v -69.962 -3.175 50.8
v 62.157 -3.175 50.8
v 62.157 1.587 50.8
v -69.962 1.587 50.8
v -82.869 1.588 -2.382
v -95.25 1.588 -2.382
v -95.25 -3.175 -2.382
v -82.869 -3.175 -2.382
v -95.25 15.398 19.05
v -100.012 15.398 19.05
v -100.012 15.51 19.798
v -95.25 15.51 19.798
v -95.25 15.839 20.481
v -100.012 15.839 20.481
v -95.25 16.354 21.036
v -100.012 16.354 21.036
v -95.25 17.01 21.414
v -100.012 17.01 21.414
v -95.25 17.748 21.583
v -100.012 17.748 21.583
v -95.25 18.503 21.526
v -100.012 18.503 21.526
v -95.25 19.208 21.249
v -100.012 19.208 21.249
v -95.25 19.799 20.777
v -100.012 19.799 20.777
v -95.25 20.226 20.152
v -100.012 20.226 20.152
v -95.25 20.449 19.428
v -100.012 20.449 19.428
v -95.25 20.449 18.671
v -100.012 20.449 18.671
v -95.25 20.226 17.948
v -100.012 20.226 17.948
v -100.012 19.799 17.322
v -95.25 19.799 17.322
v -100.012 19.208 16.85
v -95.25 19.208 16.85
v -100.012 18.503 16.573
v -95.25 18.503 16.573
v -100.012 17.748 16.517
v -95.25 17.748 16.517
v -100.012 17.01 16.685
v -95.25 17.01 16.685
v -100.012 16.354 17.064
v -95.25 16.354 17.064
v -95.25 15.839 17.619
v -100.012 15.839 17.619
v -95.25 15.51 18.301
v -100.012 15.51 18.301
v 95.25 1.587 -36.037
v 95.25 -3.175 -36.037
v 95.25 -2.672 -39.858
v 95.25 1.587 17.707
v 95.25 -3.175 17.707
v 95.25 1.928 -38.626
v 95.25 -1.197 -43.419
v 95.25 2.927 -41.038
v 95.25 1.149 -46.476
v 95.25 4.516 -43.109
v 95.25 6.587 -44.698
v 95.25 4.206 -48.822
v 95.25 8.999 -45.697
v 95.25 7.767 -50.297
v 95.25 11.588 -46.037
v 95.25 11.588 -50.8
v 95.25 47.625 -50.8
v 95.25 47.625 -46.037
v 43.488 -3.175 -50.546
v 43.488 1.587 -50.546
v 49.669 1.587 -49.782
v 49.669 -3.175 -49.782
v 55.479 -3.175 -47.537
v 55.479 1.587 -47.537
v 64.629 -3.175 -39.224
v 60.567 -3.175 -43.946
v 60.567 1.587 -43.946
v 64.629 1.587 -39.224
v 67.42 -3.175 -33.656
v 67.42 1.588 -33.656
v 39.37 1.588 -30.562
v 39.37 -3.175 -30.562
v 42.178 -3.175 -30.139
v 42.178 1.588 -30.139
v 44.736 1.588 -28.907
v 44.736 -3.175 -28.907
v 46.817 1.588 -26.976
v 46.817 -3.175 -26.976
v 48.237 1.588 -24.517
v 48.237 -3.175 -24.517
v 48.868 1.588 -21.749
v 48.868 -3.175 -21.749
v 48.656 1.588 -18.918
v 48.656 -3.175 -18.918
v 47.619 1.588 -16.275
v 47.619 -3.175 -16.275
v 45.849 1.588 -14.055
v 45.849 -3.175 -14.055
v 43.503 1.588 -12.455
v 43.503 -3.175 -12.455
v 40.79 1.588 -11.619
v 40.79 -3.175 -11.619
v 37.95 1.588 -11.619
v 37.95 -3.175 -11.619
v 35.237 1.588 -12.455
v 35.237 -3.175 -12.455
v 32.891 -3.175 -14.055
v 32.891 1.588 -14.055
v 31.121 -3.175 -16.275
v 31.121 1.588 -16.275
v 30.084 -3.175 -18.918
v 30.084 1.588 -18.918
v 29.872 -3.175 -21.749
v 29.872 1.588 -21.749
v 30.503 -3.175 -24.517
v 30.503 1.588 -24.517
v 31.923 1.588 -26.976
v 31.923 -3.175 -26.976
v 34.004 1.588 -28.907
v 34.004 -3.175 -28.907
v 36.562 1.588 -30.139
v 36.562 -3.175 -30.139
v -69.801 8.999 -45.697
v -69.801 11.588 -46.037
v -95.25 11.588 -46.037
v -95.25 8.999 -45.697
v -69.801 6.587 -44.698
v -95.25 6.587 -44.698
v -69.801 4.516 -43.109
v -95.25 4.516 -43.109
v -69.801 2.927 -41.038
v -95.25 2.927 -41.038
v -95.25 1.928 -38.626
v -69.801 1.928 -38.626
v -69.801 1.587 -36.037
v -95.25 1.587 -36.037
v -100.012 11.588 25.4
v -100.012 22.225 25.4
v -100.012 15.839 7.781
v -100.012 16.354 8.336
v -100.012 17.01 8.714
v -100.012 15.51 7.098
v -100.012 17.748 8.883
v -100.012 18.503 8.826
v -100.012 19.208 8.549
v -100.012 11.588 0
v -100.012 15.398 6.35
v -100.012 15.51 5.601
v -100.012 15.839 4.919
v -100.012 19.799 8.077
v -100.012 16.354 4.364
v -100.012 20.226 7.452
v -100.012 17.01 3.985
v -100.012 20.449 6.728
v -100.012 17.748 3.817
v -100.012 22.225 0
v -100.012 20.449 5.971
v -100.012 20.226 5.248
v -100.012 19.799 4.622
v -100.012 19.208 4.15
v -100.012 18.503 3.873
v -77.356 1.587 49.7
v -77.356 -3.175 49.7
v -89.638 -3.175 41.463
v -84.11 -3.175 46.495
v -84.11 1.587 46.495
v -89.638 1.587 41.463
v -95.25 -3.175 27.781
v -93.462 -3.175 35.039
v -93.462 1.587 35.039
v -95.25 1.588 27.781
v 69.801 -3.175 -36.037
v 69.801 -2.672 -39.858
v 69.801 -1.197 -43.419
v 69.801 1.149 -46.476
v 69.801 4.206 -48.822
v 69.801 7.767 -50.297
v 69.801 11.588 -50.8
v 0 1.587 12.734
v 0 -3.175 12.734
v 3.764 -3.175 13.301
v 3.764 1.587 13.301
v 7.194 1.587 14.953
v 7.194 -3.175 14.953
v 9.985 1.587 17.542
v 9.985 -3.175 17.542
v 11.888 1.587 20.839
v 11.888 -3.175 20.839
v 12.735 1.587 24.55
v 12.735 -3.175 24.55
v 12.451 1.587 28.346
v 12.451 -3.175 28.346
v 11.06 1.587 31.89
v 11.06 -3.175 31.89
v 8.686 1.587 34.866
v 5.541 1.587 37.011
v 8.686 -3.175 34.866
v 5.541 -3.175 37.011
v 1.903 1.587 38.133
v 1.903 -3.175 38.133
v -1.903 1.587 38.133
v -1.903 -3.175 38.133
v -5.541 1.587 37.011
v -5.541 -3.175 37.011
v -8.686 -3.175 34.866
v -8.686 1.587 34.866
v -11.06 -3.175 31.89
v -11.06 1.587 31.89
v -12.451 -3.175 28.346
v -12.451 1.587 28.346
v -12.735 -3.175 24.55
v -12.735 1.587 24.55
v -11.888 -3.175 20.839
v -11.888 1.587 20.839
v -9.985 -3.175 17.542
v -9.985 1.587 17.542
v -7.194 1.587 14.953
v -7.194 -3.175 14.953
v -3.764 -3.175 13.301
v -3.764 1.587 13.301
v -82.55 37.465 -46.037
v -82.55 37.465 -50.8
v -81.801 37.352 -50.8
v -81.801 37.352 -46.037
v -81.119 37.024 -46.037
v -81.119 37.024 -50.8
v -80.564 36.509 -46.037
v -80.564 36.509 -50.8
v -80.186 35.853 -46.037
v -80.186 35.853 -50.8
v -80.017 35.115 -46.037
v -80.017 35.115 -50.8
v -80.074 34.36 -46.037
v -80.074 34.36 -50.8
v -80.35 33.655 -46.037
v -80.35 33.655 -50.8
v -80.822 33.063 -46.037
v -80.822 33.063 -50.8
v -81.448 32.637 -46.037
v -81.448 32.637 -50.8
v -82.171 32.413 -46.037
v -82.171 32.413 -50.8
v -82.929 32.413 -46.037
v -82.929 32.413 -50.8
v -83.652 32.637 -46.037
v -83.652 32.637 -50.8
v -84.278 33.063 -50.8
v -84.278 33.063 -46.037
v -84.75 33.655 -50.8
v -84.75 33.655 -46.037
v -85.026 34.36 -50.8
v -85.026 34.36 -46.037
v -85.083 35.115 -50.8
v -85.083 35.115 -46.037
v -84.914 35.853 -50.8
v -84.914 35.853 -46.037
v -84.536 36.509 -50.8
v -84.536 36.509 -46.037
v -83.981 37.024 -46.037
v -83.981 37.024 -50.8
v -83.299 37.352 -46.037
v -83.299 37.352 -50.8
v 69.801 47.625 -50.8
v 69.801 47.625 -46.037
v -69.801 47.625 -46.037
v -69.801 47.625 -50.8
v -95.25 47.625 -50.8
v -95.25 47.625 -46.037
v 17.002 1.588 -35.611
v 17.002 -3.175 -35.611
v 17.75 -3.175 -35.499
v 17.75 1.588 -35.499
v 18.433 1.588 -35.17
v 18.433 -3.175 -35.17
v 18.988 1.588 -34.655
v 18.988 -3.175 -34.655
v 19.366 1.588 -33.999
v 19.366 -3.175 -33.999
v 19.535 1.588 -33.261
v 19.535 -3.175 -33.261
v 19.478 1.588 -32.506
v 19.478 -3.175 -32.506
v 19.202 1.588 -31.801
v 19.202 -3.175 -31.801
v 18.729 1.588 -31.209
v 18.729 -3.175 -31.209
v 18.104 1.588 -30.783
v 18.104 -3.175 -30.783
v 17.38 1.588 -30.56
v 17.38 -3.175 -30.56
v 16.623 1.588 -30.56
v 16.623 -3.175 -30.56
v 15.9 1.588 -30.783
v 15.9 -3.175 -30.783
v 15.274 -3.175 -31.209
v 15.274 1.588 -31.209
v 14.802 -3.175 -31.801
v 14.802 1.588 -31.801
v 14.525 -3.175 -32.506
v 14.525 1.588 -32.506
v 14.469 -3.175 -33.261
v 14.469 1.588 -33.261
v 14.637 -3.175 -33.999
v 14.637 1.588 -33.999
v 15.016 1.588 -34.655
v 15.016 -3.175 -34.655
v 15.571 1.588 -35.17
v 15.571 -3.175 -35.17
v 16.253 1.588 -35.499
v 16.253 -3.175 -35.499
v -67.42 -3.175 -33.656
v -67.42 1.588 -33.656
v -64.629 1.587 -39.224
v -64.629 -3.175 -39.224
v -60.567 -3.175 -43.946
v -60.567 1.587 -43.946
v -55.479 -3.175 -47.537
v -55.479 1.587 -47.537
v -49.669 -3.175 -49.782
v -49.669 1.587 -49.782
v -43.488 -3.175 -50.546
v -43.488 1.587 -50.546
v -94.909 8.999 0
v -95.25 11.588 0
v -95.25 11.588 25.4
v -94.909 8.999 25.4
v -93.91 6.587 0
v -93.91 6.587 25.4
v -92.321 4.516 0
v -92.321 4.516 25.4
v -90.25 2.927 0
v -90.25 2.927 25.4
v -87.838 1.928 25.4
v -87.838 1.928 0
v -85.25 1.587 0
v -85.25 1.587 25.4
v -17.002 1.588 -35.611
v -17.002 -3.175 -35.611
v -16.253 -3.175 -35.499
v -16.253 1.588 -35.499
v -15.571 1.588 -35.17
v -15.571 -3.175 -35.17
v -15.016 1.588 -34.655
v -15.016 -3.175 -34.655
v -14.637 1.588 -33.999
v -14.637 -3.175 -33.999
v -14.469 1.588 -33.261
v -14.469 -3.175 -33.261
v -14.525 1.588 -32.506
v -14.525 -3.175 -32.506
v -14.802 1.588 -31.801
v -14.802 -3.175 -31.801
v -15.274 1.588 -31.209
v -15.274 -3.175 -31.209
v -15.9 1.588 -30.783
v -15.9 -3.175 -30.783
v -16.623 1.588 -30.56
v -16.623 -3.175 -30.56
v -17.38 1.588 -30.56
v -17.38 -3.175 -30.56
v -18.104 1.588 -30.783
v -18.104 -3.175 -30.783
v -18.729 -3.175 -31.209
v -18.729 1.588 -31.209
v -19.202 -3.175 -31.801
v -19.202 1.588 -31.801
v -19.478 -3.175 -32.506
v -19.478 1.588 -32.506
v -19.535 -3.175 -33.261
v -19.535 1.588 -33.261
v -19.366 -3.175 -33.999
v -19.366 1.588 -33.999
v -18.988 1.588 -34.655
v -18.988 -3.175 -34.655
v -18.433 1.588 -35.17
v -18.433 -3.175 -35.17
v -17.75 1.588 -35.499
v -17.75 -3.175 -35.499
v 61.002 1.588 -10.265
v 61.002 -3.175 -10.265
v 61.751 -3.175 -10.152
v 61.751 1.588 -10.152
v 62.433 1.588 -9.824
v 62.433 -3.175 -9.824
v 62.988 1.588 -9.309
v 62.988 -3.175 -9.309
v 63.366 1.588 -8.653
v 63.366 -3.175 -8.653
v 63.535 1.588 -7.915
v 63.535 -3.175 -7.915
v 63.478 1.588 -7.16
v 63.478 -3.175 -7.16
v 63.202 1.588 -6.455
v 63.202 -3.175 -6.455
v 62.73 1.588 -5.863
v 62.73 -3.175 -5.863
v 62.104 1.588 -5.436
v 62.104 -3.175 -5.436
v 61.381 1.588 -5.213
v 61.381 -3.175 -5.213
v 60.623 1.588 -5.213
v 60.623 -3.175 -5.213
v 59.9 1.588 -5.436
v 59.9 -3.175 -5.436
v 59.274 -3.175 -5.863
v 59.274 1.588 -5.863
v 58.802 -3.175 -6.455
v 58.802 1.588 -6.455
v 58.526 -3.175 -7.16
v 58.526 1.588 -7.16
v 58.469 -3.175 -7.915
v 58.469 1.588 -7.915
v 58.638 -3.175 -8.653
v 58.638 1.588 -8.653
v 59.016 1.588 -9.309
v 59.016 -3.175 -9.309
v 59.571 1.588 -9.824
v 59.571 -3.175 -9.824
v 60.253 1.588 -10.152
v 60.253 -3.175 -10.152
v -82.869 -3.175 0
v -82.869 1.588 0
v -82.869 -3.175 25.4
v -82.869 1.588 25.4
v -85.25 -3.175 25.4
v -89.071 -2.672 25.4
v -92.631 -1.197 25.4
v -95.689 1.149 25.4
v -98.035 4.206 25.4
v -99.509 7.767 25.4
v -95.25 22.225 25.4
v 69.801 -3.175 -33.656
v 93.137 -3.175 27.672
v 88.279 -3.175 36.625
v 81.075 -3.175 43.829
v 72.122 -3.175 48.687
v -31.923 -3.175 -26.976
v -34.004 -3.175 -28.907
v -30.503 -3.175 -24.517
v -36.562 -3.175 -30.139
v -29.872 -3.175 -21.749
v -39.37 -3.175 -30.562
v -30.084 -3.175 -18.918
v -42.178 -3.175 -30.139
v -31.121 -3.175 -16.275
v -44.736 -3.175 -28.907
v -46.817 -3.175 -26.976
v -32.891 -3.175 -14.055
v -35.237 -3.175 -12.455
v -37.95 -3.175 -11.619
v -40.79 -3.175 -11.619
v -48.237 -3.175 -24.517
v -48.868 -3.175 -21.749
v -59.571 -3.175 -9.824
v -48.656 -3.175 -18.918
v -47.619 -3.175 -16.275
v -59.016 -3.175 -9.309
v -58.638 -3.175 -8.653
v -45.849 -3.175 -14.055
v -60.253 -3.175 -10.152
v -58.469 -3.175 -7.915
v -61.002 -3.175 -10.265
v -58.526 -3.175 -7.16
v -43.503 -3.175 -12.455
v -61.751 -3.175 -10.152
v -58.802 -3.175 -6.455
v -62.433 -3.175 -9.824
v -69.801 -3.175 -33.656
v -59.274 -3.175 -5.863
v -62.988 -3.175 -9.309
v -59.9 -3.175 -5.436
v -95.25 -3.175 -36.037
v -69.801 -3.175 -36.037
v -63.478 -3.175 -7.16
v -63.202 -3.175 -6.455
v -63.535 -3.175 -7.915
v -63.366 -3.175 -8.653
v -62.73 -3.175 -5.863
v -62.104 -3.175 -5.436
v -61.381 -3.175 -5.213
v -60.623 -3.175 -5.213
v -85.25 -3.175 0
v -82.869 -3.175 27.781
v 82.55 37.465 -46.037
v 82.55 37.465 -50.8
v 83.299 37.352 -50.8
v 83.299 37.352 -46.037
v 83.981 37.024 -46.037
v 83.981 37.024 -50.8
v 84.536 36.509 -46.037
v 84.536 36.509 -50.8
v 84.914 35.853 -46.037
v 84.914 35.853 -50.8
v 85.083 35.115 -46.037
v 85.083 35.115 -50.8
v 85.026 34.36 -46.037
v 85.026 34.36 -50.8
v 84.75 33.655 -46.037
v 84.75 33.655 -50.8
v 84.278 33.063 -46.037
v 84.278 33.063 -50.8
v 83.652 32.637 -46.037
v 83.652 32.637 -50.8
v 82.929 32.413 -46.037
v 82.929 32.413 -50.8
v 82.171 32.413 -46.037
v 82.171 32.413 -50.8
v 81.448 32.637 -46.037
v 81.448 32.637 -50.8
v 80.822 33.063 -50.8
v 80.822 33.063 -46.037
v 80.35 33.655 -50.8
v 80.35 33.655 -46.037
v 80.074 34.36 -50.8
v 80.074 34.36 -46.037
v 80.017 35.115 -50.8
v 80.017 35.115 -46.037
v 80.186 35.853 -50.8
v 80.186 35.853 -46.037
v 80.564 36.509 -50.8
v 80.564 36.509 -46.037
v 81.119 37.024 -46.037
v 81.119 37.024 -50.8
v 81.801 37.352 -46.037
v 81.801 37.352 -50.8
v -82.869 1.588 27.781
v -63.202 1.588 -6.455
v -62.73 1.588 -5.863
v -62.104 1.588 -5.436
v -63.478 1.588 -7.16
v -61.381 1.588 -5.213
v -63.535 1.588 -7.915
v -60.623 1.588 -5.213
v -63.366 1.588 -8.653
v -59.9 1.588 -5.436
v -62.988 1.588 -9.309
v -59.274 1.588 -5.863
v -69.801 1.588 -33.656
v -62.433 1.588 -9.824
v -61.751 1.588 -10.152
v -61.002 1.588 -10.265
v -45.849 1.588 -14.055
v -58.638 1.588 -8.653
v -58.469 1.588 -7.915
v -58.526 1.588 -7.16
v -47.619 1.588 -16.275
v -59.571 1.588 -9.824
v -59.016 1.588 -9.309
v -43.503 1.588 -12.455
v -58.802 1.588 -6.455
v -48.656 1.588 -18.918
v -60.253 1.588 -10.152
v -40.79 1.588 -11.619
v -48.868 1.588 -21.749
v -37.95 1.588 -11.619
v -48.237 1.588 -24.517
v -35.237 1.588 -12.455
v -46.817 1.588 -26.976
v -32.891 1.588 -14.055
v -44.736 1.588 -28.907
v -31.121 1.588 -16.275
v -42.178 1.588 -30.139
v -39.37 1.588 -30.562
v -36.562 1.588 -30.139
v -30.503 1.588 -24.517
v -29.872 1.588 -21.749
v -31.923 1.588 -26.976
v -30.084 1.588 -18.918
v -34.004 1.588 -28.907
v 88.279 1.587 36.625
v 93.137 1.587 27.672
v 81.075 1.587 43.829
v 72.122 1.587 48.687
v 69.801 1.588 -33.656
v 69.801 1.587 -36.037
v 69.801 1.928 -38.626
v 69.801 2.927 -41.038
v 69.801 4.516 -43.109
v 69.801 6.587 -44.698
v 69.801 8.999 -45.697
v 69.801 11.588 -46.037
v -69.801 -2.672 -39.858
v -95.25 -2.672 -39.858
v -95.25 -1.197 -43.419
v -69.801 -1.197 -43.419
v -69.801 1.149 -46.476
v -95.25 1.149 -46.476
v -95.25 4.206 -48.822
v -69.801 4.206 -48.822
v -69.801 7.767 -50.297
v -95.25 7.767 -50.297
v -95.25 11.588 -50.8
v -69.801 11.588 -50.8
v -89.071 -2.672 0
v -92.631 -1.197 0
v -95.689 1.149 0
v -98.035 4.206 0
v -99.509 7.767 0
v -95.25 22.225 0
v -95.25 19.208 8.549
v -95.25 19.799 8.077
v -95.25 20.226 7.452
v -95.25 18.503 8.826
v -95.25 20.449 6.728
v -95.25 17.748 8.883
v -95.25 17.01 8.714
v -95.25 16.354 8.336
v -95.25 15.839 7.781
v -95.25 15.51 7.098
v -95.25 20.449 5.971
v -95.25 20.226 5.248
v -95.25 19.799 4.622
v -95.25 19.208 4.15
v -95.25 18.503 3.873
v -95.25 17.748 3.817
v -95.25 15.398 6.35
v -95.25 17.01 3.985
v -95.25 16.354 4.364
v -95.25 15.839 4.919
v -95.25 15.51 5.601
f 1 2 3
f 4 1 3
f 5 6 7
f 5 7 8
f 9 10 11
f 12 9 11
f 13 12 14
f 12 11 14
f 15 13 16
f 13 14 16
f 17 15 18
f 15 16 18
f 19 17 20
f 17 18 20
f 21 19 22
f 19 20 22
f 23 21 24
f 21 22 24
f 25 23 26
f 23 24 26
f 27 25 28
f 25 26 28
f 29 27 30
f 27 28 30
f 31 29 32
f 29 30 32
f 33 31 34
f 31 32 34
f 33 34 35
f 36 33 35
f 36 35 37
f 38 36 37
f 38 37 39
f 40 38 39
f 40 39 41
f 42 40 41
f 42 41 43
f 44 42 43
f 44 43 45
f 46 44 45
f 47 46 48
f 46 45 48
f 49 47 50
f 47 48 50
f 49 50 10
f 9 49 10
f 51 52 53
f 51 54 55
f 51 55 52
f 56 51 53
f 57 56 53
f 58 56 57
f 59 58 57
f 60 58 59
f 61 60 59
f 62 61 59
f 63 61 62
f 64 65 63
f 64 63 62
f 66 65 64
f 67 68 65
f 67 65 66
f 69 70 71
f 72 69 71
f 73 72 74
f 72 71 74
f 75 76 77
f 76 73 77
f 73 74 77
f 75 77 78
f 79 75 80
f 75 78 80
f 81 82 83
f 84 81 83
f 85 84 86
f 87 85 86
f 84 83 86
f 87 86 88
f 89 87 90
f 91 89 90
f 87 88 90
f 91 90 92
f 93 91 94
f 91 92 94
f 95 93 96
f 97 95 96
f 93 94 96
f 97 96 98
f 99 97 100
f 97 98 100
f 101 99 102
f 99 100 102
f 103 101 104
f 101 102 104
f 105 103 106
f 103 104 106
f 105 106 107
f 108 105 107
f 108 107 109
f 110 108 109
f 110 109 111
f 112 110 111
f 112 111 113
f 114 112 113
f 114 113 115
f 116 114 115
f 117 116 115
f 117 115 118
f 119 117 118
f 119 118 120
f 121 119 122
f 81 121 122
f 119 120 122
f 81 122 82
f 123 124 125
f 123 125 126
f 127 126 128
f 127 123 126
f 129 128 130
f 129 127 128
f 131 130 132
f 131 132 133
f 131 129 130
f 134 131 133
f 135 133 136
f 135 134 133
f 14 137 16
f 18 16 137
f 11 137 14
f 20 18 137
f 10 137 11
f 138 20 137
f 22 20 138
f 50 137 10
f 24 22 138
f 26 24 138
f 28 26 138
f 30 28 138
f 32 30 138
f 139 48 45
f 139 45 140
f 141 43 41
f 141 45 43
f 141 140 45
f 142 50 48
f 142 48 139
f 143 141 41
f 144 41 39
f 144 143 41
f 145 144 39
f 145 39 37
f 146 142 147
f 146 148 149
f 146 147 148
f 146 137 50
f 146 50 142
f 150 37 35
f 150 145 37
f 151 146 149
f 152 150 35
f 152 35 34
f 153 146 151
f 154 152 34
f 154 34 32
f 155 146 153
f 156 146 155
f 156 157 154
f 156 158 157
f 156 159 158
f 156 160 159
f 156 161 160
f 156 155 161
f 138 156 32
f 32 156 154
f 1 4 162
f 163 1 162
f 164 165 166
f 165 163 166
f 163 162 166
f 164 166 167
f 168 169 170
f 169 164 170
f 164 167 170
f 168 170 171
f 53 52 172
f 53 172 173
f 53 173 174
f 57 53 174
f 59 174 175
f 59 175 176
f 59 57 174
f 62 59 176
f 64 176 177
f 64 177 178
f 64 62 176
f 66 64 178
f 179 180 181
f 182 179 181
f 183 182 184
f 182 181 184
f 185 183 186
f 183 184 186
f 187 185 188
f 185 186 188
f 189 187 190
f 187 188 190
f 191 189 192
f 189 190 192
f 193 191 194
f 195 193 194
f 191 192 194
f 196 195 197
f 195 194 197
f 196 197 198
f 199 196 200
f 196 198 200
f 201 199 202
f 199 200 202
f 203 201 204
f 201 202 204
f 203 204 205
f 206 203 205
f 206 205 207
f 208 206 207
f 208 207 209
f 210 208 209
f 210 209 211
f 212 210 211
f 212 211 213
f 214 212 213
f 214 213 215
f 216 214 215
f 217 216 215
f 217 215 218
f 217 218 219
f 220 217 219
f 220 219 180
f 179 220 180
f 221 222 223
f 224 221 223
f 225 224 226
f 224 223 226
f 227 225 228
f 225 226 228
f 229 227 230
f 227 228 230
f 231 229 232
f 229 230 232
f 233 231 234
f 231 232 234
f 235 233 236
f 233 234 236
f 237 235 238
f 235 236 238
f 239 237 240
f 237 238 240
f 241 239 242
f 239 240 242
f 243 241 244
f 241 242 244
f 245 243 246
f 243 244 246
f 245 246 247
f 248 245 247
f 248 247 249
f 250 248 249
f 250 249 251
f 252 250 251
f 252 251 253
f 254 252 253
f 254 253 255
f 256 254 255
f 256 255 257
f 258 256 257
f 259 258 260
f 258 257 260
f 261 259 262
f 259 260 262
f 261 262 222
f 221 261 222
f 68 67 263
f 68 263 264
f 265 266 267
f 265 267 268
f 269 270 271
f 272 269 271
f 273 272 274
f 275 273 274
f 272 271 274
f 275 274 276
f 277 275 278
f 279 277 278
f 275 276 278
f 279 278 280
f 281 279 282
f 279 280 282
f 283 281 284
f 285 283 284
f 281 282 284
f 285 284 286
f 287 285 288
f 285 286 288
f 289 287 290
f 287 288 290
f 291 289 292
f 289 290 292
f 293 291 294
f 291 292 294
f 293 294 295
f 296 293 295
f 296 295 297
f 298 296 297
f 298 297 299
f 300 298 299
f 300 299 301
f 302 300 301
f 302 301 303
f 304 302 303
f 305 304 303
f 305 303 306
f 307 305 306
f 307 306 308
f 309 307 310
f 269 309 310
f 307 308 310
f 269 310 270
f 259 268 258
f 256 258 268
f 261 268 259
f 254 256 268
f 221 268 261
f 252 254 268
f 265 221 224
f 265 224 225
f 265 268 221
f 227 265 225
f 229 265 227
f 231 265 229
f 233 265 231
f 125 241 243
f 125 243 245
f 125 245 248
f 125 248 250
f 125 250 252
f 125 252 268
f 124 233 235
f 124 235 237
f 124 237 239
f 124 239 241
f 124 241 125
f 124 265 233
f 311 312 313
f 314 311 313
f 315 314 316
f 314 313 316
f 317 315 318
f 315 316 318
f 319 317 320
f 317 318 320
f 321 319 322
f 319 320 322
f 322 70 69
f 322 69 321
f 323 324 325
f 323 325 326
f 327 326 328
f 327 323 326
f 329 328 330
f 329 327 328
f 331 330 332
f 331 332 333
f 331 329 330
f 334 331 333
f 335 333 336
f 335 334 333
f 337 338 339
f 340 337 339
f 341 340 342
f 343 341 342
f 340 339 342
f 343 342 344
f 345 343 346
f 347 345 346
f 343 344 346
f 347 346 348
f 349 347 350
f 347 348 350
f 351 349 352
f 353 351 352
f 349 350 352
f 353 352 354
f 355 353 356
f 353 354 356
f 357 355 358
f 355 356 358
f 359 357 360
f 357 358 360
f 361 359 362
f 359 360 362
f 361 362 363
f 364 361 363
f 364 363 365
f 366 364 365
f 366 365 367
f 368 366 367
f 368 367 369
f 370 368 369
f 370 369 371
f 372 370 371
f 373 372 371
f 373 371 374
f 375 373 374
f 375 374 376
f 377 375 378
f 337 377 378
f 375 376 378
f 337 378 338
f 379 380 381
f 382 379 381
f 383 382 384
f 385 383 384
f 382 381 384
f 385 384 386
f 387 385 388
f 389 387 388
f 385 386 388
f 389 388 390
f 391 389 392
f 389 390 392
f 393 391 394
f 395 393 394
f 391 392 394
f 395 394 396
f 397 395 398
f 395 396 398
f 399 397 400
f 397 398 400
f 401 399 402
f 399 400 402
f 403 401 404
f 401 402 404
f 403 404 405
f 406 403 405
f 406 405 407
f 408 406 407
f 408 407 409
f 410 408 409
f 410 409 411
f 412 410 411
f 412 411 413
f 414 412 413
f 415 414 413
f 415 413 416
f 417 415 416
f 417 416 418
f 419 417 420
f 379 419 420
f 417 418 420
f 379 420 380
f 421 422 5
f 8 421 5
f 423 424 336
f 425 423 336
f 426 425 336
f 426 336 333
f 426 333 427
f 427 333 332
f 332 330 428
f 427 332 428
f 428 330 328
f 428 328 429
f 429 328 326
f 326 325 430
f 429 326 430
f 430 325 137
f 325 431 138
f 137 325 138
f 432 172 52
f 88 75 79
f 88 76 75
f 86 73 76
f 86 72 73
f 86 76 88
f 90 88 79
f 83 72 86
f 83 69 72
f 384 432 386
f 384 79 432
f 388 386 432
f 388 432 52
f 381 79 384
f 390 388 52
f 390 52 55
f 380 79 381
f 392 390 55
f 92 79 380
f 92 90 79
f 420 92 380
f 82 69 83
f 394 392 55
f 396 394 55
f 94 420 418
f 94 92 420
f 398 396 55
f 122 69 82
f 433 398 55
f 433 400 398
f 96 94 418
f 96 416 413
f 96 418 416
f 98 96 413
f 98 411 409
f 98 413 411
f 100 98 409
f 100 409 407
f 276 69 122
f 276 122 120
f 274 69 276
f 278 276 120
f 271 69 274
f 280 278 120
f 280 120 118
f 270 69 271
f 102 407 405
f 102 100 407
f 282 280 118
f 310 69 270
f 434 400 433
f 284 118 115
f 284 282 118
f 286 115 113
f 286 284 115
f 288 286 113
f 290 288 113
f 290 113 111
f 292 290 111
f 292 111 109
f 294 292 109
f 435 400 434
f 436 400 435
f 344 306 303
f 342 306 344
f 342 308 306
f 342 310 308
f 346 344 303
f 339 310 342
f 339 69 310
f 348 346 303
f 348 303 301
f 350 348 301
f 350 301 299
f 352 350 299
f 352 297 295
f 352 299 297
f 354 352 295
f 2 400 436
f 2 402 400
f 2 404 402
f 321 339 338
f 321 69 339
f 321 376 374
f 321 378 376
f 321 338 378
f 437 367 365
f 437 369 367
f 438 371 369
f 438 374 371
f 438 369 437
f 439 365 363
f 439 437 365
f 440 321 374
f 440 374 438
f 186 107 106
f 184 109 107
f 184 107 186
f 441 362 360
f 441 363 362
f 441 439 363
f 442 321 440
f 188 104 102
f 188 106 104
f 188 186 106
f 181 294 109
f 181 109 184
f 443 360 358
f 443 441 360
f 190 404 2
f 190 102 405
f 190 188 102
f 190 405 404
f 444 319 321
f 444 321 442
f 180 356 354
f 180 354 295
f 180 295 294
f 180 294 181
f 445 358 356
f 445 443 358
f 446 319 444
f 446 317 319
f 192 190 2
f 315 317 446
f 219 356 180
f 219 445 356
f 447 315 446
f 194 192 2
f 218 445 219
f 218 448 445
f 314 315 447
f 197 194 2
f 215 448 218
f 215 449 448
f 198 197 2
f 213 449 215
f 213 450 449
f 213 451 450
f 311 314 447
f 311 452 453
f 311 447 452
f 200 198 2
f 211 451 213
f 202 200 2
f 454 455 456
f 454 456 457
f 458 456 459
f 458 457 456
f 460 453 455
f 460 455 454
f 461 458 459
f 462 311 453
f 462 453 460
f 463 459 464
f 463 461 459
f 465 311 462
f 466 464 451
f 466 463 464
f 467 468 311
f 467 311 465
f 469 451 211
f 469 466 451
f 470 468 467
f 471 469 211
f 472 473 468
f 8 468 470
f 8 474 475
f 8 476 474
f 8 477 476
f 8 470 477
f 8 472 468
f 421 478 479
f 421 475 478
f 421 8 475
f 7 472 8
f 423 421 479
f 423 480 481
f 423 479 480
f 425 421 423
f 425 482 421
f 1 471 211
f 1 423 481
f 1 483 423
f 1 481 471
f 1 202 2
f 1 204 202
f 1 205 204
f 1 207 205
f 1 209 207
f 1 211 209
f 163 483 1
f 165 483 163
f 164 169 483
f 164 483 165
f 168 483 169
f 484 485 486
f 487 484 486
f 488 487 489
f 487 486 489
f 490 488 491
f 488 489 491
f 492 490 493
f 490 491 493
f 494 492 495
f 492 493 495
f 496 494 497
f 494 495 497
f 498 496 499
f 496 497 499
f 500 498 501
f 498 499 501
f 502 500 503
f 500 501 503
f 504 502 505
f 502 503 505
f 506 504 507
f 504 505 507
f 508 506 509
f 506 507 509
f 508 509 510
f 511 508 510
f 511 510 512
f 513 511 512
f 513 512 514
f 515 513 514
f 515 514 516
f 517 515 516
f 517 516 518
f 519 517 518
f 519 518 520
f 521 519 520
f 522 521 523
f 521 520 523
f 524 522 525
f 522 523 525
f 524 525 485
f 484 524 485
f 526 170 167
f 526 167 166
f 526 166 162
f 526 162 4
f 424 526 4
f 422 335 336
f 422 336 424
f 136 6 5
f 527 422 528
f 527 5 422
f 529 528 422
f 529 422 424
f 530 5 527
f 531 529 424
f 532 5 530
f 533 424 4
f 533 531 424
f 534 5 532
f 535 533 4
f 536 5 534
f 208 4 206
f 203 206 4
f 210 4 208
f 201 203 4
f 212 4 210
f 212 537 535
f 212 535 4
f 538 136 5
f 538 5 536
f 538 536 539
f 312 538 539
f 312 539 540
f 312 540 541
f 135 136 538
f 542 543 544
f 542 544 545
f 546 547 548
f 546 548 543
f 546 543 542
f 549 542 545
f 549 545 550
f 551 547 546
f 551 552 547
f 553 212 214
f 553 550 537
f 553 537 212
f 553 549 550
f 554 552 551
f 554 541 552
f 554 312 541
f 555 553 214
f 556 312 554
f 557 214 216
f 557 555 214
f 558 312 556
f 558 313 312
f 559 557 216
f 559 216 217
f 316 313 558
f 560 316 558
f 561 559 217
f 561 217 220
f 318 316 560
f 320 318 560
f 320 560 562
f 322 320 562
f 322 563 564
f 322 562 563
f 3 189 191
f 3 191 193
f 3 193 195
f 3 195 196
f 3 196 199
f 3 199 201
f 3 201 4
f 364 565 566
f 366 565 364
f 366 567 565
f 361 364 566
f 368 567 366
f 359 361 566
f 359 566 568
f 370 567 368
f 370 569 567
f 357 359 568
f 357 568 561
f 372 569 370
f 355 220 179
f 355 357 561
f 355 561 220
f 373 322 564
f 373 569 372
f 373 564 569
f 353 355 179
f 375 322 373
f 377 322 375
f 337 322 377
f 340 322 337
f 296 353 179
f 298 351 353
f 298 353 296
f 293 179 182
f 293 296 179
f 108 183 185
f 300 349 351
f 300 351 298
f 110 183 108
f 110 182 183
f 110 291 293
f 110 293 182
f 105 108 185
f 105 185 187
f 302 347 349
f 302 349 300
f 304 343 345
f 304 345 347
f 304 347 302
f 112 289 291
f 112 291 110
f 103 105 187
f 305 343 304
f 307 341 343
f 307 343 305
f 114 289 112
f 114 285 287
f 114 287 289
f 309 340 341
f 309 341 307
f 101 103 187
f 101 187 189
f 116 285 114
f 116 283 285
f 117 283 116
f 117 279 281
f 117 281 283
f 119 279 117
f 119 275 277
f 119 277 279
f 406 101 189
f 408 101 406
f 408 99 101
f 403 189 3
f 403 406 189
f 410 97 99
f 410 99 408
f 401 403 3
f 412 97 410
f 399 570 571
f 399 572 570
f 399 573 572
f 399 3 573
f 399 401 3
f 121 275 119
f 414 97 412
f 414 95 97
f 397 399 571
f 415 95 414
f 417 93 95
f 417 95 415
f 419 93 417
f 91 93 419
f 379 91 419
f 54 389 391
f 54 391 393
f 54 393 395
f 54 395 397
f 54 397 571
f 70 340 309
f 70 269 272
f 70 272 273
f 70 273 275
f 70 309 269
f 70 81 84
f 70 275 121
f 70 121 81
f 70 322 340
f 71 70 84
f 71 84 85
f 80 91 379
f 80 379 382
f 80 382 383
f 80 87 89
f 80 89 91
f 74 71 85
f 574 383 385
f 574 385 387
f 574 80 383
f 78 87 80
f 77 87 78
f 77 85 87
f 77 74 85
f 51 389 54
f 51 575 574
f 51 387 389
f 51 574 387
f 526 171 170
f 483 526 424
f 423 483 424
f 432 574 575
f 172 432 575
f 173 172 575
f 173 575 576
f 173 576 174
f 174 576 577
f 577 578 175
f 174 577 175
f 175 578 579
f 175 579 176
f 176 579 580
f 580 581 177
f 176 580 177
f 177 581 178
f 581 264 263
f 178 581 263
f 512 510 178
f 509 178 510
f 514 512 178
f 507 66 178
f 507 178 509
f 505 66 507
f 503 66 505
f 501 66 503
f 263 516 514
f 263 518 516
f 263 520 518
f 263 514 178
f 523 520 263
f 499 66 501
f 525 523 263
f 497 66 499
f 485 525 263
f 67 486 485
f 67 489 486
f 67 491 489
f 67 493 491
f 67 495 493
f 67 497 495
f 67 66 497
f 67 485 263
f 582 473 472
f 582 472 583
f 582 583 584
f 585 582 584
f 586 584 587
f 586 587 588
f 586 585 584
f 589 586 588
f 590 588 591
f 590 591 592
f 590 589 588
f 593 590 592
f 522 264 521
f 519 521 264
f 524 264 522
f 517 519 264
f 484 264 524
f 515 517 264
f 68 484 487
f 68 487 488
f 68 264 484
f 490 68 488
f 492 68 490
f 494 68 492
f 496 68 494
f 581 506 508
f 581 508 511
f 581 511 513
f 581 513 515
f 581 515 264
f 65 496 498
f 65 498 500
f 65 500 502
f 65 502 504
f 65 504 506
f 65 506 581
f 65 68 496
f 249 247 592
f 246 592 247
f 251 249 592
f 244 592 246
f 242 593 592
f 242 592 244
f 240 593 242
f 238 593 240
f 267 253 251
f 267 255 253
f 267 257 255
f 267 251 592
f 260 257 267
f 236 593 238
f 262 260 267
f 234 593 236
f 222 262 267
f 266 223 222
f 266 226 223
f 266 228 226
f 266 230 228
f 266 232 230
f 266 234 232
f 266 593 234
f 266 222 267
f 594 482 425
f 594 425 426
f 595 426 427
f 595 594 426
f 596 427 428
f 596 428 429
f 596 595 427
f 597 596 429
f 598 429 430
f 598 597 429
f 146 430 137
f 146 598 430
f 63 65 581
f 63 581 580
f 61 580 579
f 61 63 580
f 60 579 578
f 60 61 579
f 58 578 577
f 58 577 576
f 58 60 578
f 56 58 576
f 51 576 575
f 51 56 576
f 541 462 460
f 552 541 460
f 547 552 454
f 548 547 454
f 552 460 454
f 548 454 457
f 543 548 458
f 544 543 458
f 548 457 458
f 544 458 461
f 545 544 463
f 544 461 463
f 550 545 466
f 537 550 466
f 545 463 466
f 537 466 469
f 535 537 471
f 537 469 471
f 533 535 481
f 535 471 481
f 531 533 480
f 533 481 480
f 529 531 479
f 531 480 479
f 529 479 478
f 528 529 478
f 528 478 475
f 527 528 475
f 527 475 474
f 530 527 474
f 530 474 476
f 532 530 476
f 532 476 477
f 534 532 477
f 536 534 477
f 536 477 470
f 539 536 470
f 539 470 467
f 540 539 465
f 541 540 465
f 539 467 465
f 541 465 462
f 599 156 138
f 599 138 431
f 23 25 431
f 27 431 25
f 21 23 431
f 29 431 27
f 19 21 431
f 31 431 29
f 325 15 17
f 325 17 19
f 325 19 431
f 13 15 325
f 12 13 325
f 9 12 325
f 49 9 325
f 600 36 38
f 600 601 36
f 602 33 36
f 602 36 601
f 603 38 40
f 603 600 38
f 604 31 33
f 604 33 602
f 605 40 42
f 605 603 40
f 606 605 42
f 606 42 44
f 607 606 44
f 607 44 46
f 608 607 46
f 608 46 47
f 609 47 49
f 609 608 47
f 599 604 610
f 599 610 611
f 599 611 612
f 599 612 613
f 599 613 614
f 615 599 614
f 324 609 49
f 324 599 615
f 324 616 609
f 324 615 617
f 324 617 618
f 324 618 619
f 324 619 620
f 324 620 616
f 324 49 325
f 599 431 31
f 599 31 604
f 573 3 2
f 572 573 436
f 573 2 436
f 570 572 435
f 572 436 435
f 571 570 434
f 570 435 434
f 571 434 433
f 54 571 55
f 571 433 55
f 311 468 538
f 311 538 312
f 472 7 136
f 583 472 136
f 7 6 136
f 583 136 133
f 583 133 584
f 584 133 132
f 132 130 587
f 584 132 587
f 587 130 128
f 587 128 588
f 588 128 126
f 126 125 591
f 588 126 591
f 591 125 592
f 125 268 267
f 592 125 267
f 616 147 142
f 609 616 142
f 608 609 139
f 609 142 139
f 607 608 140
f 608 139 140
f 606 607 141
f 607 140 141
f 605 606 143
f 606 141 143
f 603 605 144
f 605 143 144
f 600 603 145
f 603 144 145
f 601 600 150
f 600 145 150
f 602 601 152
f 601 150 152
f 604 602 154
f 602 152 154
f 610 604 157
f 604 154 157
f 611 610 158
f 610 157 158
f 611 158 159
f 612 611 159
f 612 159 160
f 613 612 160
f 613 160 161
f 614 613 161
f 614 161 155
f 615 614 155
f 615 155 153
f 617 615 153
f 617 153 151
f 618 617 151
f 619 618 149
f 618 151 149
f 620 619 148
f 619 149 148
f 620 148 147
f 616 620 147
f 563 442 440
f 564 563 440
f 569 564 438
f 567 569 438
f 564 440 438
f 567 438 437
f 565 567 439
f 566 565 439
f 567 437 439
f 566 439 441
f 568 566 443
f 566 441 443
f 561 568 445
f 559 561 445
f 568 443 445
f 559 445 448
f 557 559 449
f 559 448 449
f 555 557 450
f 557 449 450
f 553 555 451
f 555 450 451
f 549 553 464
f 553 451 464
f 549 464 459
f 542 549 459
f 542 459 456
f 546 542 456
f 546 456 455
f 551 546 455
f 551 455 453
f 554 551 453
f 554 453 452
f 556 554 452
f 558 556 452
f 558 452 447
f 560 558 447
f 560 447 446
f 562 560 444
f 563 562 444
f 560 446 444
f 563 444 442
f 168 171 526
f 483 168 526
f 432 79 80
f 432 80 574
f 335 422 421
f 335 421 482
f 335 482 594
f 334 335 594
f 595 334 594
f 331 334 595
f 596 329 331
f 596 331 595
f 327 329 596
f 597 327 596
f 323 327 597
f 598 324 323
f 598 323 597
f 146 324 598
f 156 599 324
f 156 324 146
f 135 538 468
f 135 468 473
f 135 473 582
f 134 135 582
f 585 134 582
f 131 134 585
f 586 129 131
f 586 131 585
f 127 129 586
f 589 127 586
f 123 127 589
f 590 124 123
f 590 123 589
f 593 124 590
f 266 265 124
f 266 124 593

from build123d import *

# Parameters (mm, degrees)
SKETCH1_W                     = 190.5
SKETCH1_H                     = 101.6
BOSS_EXTRUDE1_DEPTH           = 1.5875
CONVERT_SOLID1_START          = -95.25
CONVERT_SOLID1_OUTLINE_W      = 3.175
CONVERT_SOLID1_OUTLINE_H      = 101.6
CONVERT_SOLID1_DEPTH          = 190.5
SKETCH30_R                    = 12.770921212
CUT_EXTRUDE6_DEPTH            = 38.1
SKETCH35_W                    = 139.601875342
SKETCH35_H                    = 6.35
CUT_EXTRUDE7_DEPTH            = 0.254
EDGE_FLANGE1_STRIP_W          = 39.05
EDGE_FLANGE1_STRIP_H          = 4.7625
EDGE_FLANGE1_STRIP_CUT_DEPTH  = 25.449062329
EDGE_FLANGE1_RELIEF_W         = 41.43125
EDGE_FLANGE1_RELIEF_H         = 2.38125
EDGE_FLANGE1_RELIEF_CUT_DEPTH = 4.7625
EDGE_FLANGE1_DEPTH            = 25.449062329
EDGE_FLANGE2_STRIP_W          = 39.05
EDGE_FLANGE2_STRIP_H          = 4.7625
EDGE_FLANGE2_STRIP_CUT_DEPTH  = 25.449062329
EDGE_FLANGE2_RELIEF_W         = 41.43125
EDGE_FLANGE2_RELIEF_H         = 2.38125
EDGE_FLANGE2_RELIEF_CUT_DEPTH = 4.7625
EDGE_FLANGE2_DEPTH            = 25.449062329
SKETCH45_W                    = 4.7625
SKETCH45_H                    = 0.000254
CUT_EXTRUDE10_DEPTH           = 25.4
EDGE_FLANGE4_STRIP_W          = 39.05
EDGE_FLANGE4_STRIP_H          = 4.7625
EDGE_FLANGE4_STRIP_CUT_DEPTH  = 25.4
EDGE_FLANGE4_RELIEF_W         = 41.43125
EDGE_FLANGE4_RELIEF_H         = 2.38125
EDGE_FLANGE4_RELIEF_CUT_DEPTH = 4.7625
EDGE_FLANGE4_DEPTH            = 25.4
FILLET9_R                     = 25.4
CUT_EXTRUDE11_DEPTH           = 25.4
FILLET10_R                    = 25.4
SKETCH53_R                    = 2.54
CUT_EXTRUDE12_DEPTH           = 4.7625
SKETCH54_R                    = 2.54
CUT_EXTRUDE13_DEPTH           = 4.7625
SKETCH55_R                    = 9.525
SKETCH55_R_2                  = 2.54
CUT_EXTRUDE14_DEPTH           = 4.7625


# Read off the part's stored shape, not the designer's step: Convert-Solid1
# Sheet-metal steps are written as plain solids
with BuildPart() as part:
    # Sketch1 → Boss-Extrude1 (new body)
    with BuildSketch(Plane(origin=(0, 0, 0), x_dir=(1, 0, 0), z_dir=(0, 1, 0))):
        Rectangle(SKETCH1_W, SKETCH1_H)
    extrude(amount=BOSS_EXTRUDE1_DEPTH)

    # Convert-Solid1 outline → Convert-Solid1 (add)
    with BuildSketch(Plane.YZ.offset(CONVERT_SOLID1_START)):
        with Locations((-1.5875, 0)):
            Rectangle(CONVERT_SOLID1_OUTLINE_W, CONVERT_SOLID1_OUTLINE_H)
    extrude(amount=CONVERT_SOLID1_DEPTH)

    # Sketch30 → Cut-Extrude6 (cut)
    with BuildSketch(Plane(origin=(0, -3.175, 0), x_dir=(-1, 0, 0), z_dir=(0, -1, 0))):
        with Locations(Location((0, -25.504506424, 0), (0, 0, 90))):
            Circle(SKETCH30_R)
    extrude(amount=-CUT_EXTRUDE6_DEPTH, mode=Mode.SUBTRACT)

    # Sketch35 → Cut-Extrude7 (cut)
    with BuildSketch(Plane(origin=(0, 0, -50.8), x_dir=(-1, 0, 0), z_dir=(0, 0, -1))):
        Rectangle(SKETCH35_W, SKETCH35_H)
    extrude(amount=-CUT_EXTRUDE7_DEPTH, mode=Mode.SUBTRACT)

    # Edge-Flange1 strip (across the edge) → Edge-Flange1 strip cut (cut)
    with BuildSketch(Plane(origin=(95.25, 1.5875, -50.8), x_dir=(0, 0, 1), z_dir=(-1, 0, 0))):
        with Locations((-4.7625, -2.38125)):
            Rectangle(EDGE_FLANGE1_STRIP_W, EDGE_FLANGE1_STRIP_H)
    extrude(amount=EDGE_FLANGE1_STRIP_CUT_DEPTH, mode=Mode.SUBTRACT)

    # Edge-Flange1 relief (on the sheet) → Edge-Flange1 relief cut (cut)
    with BuildSketch(Plane(origin=(95.25, 1.5875, -36.0375), x_dir=(0, 0, 1), z_dir=(0, 1, 0))):
        with Locations((-18.334375, -26.639687329)):
            Rectangle(EDGE_FLANGE1_RELIEF_W, EDGE_FLANGE1_RELIEF_H)
    extrude(amount=-EDGE_FLANGE1_RELIEF_CUT_DEPTH, mode=Mode.SUBTRACT)

    # Edge-Flange1 section (across the edge) → Edge-Flange1 (add)
    with BuildSketch(Plane(origin=(95.25, 1.5875, -50.8), x_dir=(0, 0, 1), z_dir=(-1, 0, 0))):
        with BuildLine():
            Line((0, 10), (0, 46.0375))
            Line((0, 46.0375), (4.7625, 46.0375))
            Line((4.7625, 46.0375), (4.7625, 10))
            ThreePointArc((4.7625, 10), (7.691432188, 2.928932188), (14.7625, 0))
            Line((14.7625, 0), (14.7625, -4.7625))
            ThreePointArc((14.7625, -4.7625), (4.323836143, -0.438663857), (0, 10))
        make_face()
    extrude(amount=EDGE_FLANGE1_DEPTH)

    # Edge-Flange2 strip (across the edge) → Edge-Flange2 strip cut (cut)
    with BuildSketch(Plane(origin=(-69.800937671, 1.5875, -50.8), x_dir=(0, 0, 1), z_dir=(-1, 0, 0))):
        with Locations((-4.7625, -2.38125)):
            Rectangle(EDGE_FLANGE2_STRIP_W, EDGE_FLANGE2_STRIP_H)
    extrude(amount=EDGE_FLANGE2_STRIP_CUT_DEPTH, mode=Mode.SUBTRACT)

    # Edge-Flange2 relief (on the sheet) → Edge-Flange2 relief cut (cut)
    with BuildSketch(Plane(origin=(-69.800937671, 1.5875, -36.0375), x_dir=(0, 0, 1), z_dir=(0, 1, 0))):
        with Locations((-18.334375, 1.190625)):
            Rectangle(EDGE_FLANGE2_RELIEF_W, EDGE_FLANGE2_RELIEF_H)
    extrude(amount=-EDGE_FLANGE2_RELIEF_CUT_DEPTH, mode=Mode.SUBTRACT)

    # Edge-Flange2 section (across the edge) → Edge-Flange2 (add)
    with BuildSketch(Plane(origin=(-69.800937671, 1.5875, -50.8), x_dir=(0, 0, 1), z_dir=(-1, 0, 0))):
        with BuildLine():
            Line((0, 10), (0, 46.0375))
            Line((0, 46.0375), (4.7625, 46.0375))
            Line((4.7625, 46.0375), (4.7625, 10))
            ThreePointArc((4.7625, 10), (7.691432188, 2.928932188), (14.7625, 0))
            Line((14.7625, 0), (14.7625, -4.7625))
            ThreePointArc((14.7625, -4.7625), (4.323836143, -0.438663857), (0, 10))
        make_face()
    extrude(amount=EDGE_FLANGE2_DEPTH)

    # Sketch45 → Cut-Extrude10 (cut)
    with BuildSketch(Plane(origin=(0, 1.5875, 0), x_dir=(1, 0, 0), z_dir=(0, 1, 0))):
        with Locations((-92.86875, -25.399873)):
            Rectangle(SKETCH45_W, SKETCH45_H)
        with Locations((-92.86875, 0.000381)):
            Rectangle(SKETCH45_W, SKETCH45_H)
    extrude(amount=-CUT_EXTRUDE10_DEPTH, mode=Mode.SUBTRACT)

    # Edge-Flange4 strip (across the edge) → Edge-Flange4 strip cut (cut)
    with BuildSketch(Plane(origin=(-95.25, 1.5875, -0.000254), x_dir=(1, 0, 0), z_dir=(0, 0, 1))):
        with Locations((-9.525, -2.38125)):
            Rectangle(EDGE_FLANGE4_STRIP_W, EDGE_FLANGE4_STRIP_H)
    extrude(amount=EDGE_FLANGE4_STRIP_CUT_DEPTH, mode=Mode.SUBTRACT)

    # Edge-Flange4 relief (on the sheet) → Edge-Flange4 relief cut (cut)
    with BuildSketch(Plane(origin=(-85.25, 1.5875, -0.000254), x_dir=(1, 0, 0), z_dir=(0, 1, 0))):
        with Locations((-18.334375, 1.190625)):
            Rectangle(EDGE_FLANGE4_RELIEF_W, EDGE_FLANGE4_RELIEF_H)
        with Locations((-18.334375, -26.590625)):
            Rectangle(EDGE_FLANGE4_RELIEF_W, EDGE_FLANGE4_RELIEF_H)
    extrude(amount=-EDGE_FLANGE4_RELIEF_CUT_DEPTH, mode=Mode.SUBTRACT)

    # Edge-Flange4 section (across the edge) → Edge-Flange4 (add)
    with BuildSketch(Plane(origin=(-95.25, 1.5875, -0.000254), x_dir=(1, 0, 0), z_dir=(0, 0, 1))):
        with BuildLine():
            Line((-4.7625, 10), (-4.7625, 20.6375))
            Line((-4.7625, 20.6375), (0, 20.6375))
            Line((0, 20.6375), (0, 10))
            ThreePointArc((0, 10), (2.928932188, 2.928932188), (10, 0))
            Line((10, 0), (10, -4.7625))
            ThreePointArc((10, -4.7625), (-0.438663857, -0.438663857), (-4.7625, 10))
        make_face()
    extrude(amount=EDGE_FLANGE4_DEPTH)

    # Fillet9
    # the kernel refuses this fillet: 25.4 mm, written as the material it takes off along each edge
    with BuildSketch(Plane(origin=(-67.419687671, 61.417239936, -50.546), x_dir=(1, 0, 0), z_dir=(0, -1, 0))) as fillet9_piece_1:
        with BuildLine():
            CenterArc((23.931895975, 25.4), FILLET9_R, 199.575530564, 70.424469436)
            Line((0, 16.88975), (-0.478637919, 16.719545))
            ThreePointArc((-0.478637919, 16.719545), (-0.508, 8.444875), (-0.508, 0))
            Line((-0.508, 0), (0, -0.508))
            Line((0, -0.508), (23.931895975, -0.508))
            Line((23.931895975, -0.508), (23.931895975, 0))
        make_face()
    extrude(amount=124.421979873, mode=Mode.SUBTRACT)
    with BuildSketch(Plane(origin=(67.419687671, 61.417239936, -50.546), x_dir=(0, 0, 1), z_dir=(0, -1, 0))) as fillet9_piece_2:
        with BuildLine():
            CenterArc((25.4, 23.931895975), FILLET9_R, 180, 70.424469436)
            Line((0, 23.931895975), (-0.508, 23.931895975))
            Line((-0.508, 23.931895975), (-0.508, 0))
            Line((-0.508, 0), (0, -0.508))
            ThreePointArc((0, -0.508), (8.444875, -0.508), (16.719545, -0.478637919))
            Line((16.719545, -0.478637919), (16.88975, 0))
        make_face()
    extrude(amount=124.421979873, mode=Mode.SUBTRACT)

    # Sketch52 → Cut-Extrude11 (cut)
    with BuildSketch(Plane.XZ.offset(3.175)):
        with BuildLine():
            ThreePointArc((62.156767956, 50.8), (84.936935051, 40.486935051), (95.25, 17.706767956))
            Line((95.25, 17.706767956), (95.25, 50.8))
            Line((95.25, 50.8), (62.156767956, 50.8))
        make_face()
    extrude(amount=-CUT_EXTRUDE11_DEPTH, mode=Mode.SUBTRACT)

    # Fillet10
    # the kernel refuses this fillet: 25.4 mm, written as the material it takes off along each edge
    with BuildSketch(Plane(origin=(-95.25, 64.807891195, 50.8), x_dir=(1, 0, 0), z_dir=(0, -1, 0))) as fillet10_piece_1:
        with BuildLine():
            CenterArc((25.288156478, -25.4), FILLET10_R, 90, 84.621196501)
            Line((0, -23.019004), (-0.50576313, -22.97138408))
            ThreePointArc((-0.50576313, -22.97138408), (-0.508, -11.509502), (-0.508, 0))
            Line((-0.508, 0), (0, 0.508))
            Line((0, 0.508), (25.288156478, 0.508))
            Line((25.288156478, 0.508), (25.288156478, 0))
        make_face()
    extrude(amount=131.203282389, mode=Mode.SUBTRACT)

    # Sketch53 → Cut-Extrude12 (cut)
    with BuildSketch(Plane.ZY.offset(100.0125)):
        with Locations(Location((6.349746, 17.9375, 0), (0, 0, 270))):
            Circle(SKETCH53_R)
        with Locations(Location((19.049746, 17.9375, 0), (0, 0, 270))):
            Circle(SKETCH53_R)
    extrude(amount=-CUT_EXTRUDE12_DEPTH, mode=Mode.SUBTRACT)

    # Sketch54 → Cut-Extrude13 (cut)
    with BuildSketch(Plane(origin=(0, 0, -50.8), x_dir=(-1, 0, 0), z_dir=(0, 0, -1))):
        with Locations(Location((-82.55, 34.925, 0), (0, 0, 90))):
            Circle(SKETCH54_R)
        with Locations(Location((82.55, 34.925, 0), (0, 0, 90))):
            Circle(SKETCH54_R)
    extrude(amount=-CUT_EXTRUDE13_DEPTH, mode=Mode.SUBTRACT)

    # Sketch55 → Cut-Extrude14 (cut)
    with BuildSketch(Plane.XZ.offset(3.175)):
        with Locations(Location((-39.37, -21.037138368, 0), (0, 0, 270))):
            Circle(SKETCH55_R)
        with Locations(Location((39.37, -21.037138368, 0), (0, 0, 270))):
            Circle(SKETCH55_R)
        with Locations(Location((-17.001810213, -33.071426284, 0), (0, 0, 270))):
            Circle(SKETCH55_R_2)
        with Locations(Location((-61.002047674, -7.724944205, 0), (0, 0, 270))):
            Circle(SKETCH55_R_2)
        with Locations(Location((61.002047674, -7.724944205, 0), (0, 0, 270))):
            Circle(SKETCH55_R_2)
        with Locations(Location((17.001810213, -33.071426284, 0), (0, 0, 270))):
            Circle(SKETCH55_R_2)
    extrude(amount=-CUT_EXTRUDE14_DEPTH, mode=Mode.SUBTRACT)


solid = part.part
